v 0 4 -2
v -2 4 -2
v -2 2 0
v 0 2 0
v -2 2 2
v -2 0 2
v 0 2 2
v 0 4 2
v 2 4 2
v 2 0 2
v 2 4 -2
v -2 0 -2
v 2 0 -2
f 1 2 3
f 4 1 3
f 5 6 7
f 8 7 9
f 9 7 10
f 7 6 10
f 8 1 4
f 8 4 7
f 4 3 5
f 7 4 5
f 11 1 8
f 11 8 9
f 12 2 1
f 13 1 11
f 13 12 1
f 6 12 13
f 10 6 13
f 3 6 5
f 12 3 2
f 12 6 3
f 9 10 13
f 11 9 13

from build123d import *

# Parameters (mm, degrees)
SKETCH1_W           = 4
SKETCH1_H           = 4
BOSS_EXTRUDE1_DEPTH = 4
CUT_EXTRUDE1_DEPTH  = 2


with BuildPart() as part:
    # Sketch1 → Boss-Extrude1 (new body)
    with BuildSketch(Plane(origin=(0, 0, 0), x_dir=(1, 0, 0), z_dir=(0, 1, 0))):
        Rectangle(SKETCH1_W, SKETCH1_H)
    extrude(amount=BOSS_EXTRUDE1_DEPTH)

    # Sketch2 → Cut-Extrude1 (cut)
    with BuildSketch(Plane.ZY.offset(2)):
        Polygon((-2, 4), (0, 2), (2, 2), (2, 4), align=None)
    extrude(amount=-CUT_EXTRUDE1_DEPTH, mode=Mode.SUBTRACT)


solid = part.part
